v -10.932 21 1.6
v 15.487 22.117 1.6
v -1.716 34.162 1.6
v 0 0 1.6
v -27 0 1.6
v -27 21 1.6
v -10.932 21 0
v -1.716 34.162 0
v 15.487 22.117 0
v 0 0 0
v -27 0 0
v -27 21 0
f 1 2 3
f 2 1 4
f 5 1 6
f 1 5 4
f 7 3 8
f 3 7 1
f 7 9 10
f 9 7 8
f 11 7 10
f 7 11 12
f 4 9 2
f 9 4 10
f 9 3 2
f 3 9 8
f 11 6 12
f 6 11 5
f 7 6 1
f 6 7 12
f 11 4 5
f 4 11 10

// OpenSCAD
w=21;
l=54;
h=1.6;

rotate([0,0,55])
cube([l/2,w,h]);
translate([-l/2,0,0])
cube([l/2,w,h]);
